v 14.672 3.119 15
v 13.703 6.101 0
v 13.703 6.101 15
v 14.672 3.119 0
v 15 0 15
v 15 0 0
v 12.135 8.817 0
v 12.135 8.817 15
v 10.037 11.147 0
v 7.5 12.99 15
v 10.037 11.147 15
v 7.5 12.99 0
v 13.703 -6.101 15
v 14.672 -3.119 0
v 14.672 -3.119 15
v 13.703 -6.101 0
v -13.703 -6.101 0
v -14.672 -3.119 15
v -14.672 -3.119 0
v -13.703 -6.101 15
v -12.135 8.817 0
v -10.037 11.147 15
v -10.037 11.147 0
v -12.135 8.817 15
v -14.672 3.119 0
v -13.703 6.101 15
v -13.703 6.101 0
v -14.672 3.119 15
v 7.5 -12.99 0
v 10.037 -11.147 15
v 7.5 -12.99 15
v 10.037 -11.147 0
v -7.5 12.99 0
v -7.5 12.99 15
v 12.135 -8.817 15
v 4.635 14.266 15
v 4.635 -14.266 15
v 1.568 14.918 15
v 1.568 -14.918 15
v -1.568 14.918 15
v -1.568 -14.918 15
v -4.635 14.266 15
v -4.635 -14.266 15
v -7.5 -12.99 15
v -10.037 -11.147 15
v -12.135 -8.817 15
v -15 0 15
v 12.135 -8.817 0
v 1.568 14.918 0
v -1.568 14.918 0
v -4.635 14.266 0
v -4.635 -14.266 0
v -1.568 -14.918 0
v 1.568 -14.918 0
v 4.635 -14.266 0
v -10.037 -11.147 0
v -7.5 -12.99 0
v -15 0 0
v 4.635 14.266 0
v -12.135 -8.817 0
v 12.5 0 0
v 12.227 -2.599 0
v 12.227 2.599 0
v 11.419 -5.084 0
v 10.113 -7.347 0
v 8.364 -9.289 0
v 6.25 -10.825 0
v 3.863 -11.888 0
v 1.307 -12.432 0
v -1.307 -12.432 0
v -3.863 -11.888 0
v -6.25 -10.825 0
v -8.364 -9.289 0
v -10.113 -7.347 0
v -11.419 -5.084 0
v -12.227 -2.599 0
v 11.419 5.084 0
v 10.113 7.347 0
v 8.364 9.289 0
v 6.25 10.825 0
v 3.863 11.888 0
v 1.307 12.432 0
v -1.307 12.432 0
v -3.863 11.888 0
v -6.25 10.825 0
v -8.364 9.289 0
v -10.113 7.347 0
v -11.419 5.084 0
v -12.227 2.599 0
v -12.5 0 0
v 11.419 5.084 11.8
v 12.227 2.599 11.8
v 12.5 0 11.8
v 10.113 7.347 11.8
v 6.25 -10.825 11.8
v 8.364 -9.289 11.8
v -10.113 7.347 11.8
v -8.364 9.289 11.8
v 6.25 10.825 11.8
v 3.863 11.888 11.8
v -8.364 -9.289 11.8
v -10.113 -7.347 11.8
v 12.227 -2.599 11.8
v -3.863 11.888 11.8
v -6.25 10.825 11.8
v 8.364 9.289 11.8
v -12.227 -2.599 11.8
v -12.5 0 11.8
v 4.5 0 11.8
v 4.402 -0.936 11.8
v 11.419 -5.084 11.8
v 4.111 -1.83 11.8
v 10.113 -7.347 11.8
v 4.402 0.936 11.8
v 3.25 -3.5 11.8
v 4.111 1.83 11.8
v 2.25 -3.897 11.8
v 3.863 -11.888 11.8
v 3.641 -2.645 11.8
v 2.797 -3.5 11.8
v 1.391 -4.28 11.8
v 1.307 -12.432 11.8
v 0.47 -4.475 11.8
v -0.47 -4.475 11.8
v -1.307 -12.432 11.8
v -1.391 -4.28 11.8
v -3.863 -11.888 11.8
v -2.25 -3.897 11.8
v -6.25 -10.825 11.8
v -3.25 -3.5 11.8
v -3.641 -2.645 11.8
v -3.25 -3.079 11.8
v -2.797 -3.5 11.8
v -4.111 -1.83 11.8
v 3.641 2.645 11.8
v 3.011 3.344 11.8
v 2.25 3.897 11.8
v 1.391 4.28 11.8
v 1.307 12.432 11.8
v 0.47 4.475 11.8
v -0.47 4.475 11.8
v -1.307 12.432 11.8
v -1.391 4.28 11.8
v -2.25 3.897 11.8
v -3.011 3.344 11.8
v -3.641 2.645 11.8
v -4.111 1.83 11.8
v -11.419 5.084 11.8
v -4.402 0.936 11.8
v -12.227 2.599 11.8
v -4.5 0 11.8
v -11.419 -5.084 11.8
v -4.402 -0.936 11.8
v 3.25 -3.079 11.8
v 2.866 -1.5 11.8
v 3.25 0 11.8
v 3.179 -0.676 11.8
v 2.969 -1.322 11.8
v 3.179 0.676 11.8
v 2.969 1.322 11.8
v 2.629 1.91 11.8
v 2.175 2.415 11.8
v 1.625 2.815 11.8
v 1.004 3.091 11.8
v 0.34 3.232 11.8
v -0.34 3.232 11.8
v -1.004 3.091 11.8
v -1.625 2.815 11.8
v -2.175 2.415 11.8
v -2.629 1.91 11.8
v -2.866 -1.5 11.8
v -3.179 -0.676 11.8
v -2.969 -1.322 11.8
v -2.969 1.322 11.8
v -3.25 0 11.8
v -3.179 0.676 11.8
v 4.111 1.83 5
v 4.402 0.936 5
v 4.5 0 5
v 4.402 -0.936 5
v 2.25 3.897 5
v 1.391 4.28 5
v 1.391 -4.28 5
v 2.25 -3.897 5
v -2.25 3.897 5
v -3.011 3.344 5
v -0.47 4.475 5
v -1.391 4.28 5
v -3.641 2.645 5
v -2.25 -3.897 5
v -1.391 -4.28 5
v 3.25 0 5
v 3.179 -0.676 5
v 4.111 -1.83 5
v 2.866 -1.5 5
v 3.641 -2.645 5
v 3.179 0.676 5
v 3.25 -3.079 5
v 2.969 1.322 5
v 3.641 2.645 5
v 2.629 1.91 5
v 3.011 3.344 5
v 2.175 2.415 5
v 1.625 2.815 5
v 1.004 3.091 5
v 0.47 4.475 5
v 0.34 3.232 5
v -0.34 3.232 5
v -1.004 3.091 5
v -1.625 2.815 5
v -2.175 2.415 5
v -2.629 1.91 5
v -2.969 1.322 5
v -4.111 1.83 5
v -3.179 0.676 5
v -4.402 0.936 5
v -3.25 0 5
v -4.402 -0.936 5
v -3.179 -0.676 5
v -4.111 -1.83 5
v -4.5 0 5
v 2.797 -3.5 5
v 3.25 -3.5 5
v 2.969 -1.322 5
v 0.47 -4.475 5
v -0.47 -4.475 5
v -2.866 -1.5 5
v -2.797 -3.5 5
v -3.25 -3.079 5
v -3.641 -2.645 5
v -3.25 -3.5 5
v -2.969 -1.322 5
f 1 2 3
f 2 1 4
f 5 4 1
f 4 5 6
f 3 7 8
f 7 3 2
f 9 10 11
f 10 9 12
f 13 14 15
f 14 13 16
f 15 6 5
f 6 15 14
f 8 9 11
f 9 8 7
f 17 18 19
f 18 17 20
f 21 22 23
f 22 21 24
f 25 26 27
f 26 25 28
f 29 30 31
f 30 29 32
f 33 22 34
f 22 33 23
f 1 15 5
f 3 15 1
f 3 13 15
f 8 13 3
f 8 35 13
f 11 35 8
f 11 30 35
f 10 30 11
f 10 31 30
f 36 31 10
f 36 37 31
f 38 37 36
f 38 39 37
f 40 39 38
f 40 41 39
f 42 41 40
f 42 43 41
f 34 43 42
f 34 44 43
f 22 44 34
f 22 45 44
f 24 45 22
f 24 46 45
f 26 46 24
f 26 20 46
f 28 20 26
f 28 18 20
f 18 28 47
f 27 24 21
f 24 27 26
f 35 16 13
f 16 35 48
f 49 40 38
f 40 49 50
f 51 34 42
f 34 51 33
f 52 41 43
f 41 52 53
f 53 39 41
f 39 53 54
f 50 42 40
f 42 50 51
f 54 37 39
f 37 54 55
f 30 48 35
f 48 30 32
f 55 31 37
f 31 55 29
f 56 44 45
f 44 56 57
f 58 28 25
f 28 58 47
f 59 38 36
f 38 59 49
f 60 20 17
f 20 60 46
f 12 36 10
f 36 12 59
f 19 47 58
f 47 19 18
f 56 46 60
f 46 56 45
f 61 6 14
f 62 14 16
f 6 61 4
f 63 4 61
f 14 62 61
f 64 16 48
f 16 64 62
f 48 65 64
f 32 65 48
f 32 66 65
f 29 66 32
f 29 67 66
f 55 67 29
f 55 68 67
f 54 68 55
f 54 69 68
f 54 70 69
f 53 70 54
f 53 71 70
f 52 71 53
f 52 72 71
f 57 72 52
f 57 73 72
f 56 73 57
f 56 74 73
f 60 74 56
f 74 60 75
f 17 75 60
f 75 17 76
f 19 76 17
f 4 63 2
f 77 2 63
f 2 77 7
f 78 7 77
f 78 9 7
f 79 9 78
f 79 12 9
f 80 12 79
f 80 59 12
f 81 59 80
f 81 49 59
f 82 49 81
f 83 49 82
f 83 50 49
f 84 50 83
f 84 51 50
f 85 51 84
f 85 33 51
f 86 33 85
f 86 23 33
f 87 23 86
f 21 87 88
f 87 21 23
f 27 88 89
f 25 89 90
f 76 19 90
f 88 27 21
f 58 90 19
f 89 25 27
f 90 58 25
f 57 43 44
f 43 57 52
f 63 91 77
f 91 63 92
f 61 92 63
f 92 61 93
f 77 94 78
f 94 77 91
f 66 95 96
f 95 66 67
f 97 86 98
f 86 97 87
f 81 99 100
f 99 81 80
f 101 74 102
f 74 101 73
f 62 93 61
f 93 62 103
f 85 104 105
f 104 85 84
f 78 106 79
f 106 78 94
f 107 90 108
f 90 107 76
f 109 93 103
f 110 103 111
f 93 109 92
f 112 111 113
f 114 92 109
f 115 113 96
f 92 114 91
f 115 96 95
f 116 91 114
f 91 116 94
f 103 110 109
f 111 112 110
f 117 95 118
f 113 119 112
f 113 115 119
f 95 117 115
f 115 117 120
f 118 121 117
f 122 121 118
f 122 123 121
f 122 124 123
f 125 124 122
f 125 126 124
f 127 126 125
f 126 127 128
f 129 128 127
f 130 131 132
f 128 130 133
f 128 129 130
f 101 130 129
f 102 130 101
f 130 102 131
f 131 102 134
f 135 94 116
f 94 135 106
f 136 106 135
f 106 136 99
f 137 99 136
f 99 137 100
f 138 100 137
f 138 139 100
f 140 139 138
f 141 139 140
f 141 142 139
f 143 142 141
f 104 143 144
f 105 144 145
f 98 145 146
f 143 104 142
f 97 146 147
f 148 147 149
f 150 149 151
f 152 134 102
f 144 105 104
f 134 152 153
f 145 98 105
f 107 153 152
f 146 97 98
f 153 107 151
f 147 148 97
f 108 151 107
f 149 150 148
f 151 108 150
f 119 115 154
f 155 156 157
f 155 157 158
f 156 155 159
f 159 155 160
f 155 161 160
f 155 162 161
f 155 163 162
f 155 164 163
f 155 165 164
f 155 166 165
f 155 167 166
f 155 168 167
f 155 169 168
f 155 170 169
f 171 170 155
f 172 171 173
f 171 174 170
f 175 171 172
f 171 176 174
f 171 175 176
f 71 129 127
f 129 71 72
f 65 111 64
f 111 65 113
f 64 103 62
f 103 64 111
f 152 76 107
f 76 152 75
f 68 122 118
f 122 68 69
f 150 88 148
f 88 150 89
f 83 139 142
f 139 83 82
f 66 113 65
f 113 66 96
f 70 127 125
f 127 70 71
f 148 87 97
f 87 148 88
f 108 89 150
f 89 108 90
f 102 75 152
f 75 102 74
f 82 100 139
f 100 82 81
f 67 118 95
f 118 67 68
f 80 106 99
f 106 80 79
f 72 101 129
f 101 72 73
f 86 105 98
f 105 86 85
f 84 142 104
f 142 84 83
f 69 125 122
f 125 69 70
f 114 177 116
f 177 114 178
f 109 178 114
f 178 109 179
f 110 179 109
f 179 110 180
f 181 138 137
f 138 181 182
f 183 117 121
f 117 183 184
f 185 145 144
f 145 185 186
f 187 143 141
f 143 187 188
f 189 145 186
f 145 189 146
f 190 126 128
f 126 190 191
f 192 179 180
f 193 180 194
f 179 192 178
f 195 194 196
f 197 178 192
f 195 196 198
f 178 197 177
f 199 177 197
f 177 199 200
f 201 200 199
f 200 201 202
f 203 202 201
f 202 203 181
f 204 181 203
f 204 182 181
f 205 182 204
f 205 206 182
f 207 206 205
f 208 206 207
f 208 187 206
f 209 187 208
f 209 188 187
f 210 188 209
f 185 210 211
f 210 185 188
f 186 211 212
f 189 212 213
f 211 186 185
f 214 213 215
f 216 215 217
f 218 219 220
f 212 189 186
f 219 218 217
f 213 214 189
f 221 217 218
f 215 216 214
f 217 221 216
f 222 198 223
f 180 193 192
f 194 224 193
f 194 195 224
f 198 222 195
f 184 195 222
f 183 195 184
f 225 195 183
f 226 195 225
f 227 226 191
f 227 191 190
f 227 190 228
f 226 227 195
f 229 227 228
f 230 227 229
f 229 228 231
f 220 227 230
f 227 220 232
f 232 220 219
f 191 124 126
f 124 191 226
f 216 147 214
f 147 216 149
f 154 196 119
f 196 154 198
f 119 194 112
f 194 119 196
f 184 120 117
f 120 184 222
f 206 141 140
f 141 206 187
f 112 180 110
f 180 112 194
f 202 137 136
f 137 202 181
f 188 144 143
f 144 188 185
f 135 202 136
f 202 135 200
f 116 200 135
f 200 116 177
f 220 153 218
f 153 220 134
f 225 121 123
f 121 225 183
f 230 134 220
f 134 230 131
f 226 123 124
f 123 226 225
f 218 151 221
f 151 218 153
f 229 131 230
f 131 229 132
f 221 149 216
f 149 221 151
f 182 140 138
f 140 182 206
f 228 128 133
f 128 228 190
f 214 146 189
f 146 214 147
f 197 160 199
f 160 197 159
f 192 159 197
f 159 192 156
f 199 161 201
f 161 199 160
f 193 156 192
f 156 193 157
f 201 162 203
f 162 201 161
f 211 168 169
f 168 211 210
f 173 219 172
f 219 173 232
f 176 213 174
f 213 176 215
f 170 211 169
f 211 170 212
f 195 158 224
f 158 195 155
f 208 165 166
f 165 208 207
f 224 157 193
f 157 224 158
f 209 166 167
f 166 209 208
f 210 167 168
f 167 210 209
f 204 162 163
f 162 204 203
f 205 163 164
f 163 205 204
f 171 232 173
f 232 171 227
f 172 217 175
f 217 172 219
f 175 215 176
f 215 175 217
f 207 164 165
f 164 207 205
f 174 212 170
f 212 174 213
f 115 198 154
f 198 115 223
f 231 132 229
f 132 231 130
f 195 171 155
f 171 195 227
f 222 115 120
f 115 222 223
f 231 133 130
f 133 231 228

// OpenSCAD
knob_od=30;
knob_id=25 /* 32 */;
knob_oh=15;
knob_ih=12 /* 14 */;

eps=0.2;

pot_od=9;
pot_id=6.5;
pot_oh=7;
pot_ih=8;


difference() {
    cylinder(h=knob_oh,d=knob_od, $fn=30);
    translate([0,0,-eps])
        cylinder(h=knob_ih,d=knob_id, $fn=30);
}


translate([0,0,knob_ih-pot_oh]) union() { difference() {
    cylinder(h=pot_oh,d=pot_od, $fn=30);
    translate([0,0,-eps])
        cylinder(h=pot_ih,d=pot_id, $fn=30);
  }
  translate([-pot_id/2,-3.5,0])
    cube([pot_id,2,pot_ih]);
}
